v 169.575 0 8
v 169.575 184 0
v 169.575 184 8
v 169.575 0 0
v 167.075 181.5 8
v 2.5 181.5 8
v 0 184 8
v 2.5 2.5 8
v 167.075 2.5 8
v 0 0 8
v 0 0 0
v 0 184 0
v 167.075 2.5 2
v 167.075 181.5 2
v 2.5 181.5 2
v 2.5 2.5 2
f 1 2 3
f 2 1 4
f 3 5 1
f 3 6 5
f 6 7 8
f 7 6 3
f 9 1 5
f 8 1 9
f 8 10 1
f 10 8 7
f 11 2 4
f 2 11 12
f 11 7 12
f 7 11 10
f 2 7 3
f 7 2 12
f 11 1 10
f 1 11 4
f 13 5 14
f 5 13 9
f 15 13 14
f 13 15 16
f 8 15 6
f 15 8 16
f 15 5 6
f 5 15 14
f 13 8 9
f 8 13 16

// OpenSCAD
// use the same width and depth as with the bee box

width = 146.575; 
depth = 179;
height = 8;

difference() {
cube([width+18+5,depth+5,height]);
color("green") translate([2.5,2.5,2]) cube([width+18,depth,height]);
}
